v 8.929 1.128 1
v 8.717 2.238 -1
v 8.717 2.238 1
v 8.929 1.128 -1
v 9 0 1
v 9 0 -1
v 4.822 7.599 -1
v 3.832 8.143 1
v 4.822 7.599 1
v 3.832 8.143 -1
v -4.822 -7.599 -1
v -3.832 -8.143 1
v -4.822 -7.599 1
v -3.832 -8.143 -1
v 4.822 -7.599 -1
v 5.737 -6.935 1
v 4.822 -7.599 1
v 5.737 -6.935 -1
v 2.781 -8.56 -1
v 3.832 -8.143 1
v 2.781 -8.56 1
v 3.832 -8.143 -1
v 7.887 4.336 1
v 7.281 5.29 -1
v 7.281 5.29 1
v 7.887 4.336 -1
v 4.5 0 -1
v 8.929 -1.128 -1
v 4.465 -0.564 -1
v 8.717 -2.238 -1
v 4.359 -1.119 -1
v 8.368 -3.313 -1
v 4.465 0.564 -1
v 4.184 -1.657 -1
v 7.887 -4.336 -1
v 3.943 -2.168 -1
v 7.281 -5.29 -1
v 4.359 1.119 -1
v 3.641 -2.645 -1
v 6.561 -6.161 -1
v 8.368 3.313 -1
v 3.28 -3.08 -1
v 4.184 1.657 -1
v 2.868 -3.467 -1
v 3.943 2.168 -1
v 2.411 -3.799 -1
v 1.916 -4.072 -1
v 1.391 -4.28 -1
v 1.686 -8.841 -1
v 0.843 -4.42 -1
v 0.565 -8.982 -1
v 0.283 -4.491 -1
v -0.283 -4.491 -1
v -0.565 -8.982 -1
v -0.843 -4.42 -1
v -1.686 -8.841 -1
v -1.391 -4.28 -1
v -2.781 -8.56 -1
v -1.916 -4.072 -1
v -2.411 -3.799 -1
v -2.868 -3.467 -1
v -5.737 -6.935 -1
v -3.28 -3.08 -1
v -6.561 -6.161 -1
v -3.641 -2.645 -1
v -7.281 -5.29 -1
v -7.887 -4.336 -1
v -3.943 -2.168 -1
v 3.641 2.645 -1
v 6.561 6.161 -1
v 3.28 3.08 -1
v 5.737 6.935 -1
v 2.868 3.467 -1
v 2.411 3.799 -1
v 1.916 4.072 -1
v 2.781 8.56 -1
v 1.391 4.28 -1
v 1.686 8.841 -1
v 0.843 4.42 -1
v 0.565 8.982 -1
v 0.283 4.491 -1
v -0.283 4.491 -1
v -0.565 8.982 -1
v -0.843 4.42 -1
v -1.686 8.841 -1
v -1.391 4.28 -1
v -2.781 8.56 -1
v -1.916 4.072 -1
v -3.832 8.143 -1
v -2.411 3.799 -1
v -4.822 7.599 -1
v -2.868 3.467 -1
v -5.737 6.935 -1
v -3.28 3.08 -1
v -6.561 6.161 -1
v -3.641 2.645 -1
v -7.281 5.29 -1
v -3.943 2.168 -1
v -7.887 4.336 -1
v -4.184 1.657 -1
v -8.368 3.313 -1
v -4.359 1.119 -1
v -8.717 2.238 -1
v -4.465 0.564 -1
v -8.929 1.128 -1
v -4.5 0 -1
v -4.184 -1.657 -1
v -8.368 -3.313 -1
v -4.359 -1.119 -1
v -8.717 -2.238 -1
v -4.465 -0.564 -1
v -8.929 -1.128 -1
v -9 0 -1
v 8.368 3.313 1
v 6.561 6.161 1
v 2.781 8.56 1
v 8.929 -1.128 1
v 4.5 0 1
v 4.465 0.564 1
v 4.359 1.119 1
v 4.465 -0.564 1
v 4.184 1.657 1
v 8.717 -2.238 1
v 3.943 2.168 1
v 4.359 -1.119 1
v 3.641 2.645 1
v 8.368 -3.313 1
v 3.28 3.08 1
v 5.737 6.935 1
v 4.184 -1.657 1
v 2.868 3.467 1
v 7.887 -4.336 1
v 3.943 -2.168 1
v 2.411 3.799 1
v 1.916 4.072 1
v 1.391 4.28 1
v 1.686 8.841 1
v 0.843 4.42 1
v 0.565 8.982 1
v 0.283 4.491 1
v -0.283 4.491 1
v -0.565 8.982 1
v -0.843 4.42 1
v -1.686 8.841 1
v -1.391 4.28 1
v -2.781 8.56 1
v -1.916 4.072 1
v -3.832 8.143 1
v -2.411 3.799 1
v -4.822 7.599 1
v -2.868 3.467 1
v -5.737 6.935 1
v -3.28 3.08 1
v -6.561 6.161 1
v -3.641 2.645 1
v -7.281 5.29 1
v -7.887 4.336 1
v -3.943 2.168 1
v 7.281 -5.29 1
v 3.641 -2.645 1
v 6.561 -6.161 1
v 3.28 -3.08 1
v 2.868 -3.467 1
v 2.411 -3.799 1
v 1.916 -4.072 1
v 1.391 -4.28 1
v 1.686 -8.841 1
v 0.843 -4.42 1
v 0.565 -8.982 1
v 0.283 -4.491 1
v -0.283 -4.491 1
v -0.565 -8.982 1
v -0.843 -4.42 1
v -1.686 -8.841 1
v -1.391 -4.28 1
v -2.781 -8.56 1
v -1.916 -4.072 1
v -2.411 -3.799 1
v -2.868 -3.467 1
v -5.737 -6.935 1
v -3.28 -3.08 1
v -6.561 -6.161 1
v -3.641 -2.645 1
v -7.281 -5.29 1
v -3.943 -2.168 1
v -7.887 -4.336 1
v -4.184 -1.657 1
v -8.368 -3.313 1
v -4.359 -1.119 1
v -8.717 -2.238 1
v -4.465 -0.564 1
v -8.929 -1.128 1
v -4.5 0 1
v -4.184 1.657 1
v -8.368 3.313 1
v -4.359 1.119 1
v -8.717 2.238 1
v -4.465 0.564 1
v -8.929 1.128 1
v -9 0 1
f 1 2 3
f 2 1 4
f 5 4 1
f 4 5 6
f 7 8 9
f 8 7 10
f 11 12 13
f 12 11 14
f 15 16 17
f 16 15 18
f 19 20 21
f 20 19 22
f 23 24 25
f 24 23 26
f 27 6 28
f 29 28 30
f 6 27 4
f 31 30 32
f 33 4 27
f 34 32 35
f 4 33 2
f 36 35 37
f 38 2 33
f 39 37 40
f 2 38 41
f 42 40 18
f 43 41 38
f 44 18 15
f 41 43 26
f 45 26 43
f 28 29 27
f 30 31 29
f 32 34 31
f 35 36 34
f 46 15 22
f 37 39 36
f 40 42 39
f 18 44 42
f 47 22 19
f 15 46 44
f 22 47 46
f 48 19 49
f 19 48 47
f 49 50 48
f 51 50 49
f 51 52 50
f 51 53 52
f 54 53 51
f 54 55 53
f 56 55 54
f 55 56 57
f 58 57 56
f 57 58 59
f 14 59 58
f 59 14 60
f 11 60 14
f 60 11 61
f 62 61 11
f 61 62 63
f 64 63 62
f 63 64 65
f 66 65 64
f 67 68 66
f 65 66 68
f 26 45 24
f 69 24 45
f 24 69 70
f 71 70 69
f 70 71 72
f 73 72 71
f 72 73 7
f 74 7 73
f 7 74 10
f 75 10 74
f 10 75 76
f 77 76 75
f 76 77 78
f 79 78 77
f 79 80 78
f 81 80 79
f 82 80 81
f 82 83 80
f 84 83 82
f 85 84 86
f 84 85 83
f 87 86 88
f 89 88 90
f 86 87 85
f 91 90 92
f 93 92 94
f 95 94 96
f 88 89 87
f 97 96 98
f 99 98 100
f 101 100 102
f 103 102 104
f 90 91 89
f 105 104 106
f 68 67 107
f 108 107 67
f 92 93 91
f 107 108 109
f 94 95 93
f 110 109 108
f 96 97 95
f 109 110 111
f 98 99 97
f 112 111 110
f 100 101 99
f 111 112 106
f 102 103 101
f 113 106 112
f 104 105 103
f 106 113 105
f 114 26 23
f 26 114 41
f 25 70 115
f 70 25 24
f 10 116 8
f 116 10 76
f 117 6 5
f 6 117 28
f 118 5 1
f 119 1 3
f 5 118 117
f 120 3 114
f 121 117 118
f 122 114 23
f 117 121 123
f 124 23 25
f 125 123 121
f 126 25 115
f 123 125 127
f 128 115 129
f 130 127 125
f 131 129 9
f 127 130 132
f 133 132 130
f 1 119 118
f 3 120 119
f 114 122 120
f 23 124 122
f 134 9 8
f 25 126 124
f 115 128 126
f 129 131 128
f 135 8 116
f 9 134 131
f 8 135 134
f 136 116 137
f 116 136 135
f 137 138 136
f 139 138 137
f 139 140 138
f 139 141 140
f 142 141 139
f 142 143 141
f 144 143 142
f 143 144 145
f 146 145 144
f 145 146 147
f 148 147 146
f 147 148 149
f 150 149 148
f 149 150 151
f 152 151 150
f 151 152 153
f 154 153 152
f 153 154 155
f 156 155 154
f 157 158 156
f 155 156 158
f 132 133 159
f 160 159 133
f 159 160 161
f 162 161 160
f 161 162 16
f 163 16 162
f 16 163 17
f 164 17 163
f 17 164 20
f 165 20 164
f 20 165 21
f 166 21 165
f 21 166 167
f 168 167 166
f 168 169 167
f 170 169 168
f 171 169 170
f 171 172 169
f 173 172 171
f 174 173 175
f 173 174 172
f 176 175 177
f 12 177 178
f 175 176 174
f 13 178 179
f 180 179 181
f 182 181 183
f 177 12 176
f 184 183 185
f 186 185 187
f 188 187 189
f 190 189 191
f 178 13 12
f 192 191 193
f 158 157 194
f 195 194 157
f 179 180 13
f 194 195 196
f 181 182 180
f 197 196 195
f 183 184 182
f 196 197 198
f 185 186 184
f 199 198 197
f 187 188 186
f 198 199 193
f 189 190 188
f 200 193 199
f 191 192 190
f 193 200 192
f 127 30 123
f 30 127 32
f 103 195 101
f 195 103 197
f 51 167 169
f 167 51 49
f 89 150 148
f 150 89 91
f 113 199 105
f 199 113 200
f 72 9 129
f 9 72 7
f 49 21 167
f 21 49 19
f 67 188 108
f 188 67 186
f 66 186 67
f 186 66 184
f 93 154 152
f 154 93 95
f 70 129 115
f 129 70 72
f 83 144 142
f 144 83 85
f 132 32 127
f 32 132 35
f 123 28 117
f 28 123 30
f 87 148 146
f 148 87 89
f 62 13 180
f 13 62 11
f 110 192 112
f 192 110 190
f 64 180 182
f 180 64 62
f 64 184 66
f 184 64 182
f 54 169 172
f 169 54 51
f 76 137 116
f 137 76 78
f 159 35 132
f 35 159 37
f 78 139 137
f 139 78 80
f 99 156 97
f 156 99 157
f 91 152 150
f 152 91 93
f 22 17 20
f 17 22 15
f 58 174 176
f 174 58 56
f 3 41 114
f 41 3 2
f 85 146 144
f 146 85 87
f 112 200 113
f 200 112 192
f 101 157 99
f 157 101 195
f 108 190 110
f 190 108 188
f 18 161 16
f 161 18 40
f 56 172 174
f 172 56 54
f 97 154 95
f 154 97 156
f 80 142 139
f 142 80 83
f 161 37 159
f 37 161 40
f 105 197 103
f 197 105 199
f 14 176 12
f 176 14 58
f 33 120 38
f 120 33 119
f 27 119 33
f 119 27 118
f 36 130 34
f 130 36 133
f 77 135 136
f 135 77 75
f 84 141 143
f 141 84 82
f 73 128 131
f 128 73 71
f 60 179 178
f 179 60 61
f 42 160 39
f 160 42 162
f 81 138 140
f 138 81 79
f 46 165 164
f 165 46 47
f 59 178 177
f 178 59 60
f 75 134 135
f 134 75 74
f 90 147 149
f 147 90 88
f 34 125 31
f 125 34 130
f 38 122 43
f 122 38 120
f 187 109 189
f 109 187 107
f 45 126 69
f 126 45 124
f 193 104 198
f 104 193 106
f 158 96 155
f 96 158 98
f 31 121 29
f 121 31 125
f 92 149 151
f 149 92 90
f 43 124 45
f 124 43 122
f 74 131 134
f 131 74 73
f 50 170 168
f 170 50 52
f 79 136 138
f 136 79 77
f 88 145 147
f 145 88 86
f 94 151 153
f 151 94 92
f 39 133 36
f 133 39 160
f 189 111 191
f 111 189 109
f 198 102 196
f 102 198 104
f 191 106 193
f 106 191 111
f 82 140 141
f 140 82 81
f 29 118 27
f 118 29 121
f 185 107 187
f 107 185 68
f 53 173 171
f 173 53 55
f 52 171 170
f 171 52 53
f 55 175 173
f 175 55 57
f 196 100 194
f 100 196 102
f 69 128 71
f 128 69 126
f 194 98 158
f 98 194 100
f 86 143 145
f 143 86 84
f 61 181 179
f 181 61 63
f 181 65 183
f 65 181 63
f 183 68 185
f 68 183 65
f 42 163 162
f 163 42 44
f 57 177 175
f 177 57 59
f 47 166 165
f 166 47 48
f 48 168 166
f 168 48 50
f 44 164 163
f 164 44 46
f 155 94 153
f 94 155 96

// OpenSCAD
$fn = 50;


difference() {
	union() {
		translate(v = [0, 0, -1.0000000000]) {
			cylinder(h = 2, r = 9.0000000000);
		}
	}
	union() {
		translate(v = [0, 0, -100.0000000000]) {
			cylinder(h = 200, r = 4.5000000000);
		}
	}
}
